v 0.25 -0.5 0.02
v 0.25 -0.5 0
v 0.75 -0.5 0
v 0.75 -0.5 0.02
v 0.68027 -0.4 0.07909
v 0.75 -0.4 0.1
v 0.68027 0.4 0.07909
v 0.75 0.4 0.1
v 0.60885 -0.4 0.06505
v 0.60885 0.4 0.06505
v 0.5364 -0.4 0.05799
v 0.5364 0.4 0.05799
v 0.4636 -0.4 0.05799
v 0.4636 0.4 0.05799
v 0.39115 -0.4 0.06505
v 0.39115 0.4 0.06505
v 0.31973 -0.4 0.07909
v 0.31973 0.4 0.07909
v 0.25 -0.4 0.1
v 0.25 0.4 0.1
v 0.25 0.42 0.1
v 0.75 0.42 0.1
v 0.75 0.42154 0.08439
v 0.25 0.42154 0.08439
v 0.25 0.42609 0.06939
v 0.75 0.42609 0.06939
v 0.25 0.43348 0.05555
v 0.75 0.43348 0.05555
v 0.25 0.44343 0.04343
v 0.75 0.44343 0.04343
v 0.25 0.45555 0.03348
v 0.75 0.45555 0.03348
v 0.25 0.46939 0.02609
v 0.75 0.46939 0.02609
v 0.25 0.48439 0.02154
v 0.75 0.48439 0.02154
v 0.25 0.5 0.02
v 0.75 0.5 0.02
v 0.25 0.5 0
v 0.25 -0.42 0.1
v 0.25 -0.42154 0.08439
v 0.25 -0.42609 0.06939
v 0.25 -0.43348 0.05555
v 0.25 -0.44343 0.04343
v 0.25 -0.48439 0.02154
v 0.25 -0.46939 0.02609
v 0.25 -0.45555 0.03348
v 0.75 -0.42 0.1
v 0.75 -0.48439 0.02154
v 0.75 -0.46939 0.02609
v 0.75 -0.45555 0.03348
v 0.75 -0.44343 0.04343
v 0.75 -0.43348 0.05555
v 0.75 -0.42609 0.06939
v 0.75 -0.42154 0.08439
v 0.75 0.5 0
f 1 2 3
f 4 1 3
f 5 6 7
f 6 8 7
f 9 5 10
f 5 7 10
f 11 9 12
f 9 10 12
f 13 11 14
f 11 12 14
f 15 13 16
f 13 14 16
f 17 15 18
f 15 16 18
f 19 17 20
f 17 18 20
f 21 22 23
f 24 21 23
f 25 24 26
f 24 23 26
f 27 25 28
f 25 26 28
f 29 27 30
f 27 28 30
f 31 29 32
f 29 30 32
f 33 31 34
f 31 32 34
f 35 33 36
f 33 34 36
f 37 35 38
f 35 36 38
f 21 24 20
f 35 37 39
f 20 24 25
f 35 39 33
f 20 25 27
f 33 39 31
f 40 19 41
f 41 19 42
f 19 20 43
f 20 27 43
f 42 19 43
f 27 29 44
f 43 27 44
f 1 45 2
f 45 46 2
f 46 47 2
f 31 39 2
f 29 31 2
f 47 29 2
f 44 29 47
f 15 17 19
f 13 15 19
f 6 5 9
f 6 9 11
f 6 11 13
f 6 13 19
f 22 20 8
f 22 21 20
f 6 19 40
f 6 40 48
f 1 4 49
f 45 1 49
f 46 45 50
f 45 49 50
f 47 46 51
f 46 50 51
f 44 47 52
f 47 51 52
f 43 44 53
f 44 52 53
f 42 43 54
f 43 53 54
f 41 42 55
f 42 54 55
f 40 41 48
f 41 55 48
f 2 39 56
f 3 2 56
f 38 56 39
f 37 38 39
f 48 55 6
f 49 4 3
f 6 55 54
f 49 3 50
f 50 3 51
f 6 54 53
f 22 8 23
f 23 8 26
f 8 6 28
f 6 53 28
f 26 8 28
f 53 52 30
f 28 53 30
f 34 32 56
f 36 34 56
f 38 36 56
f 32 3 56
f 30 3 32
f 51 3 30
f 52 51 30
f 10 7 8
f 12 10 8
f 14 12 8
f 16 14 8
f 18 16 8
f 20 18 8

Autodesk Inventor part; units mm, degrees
ref_plane "YZ Plane" through (0, 0, 0) normal (1, 0, 0) x (0, 1, 0)
sketch "스케치1" plane through (0, 0, 0) normal (0, 0, 1) x (1, 0, 0)
  line L0 (-0.15, 0) -> (0.9, 0) construction
  line L1 (0, -0.7) -> (0, 0.7) construction
  line L2 (0.25, -0.5) -> (0.75, -0.5)
  line L3 (0.75, -0.5) -> (0.75, 0.5)
  line L4 (0.75, 0.5) -> (0.25, 0.5)
  line L5 (0.25, 0.5) -> (0.25, -0.5)
  point P0 (0, 0)
  point P1 (0.5, -0.5)
  dimension "d7" = 0.5
  dimension "d8" = 1
  dimension "d9" = 0.25
extrude "돌출1" add sketch "스케치1" along normal blind 0.1
sketch "스케치3" plane through (0.25, 0.5, 0) normal (0, 1, 0) x (1, 0, 0)
  line L0 (-0.25, 0.7571) -> (-0.25, -0.2929) construction
  line L1 (-0.4, 0) -> (0.65, 0) construction
  line L2 (0.5, 0) -> (0, 0) projected
  line L3 (0, 0) -> (0, -0.1) projected
  line L4 (0.5, -0.1) -> (0, -0.1) projected
  line L5 (0.5, 0) -> (0.5, -0.1) projected
  arc A0 (0, -0.1) -> (0.5, -0.1) centre (0.25, 0.6071) ccw
  line L6 (0.25, -0.1) -> (0.25, 0.4799) construction
  point P0 (-0.25, 0)
  dimension "d10" = 0.75
sketch "스케치5" plane through (0, 0, 0.1) normal (0, 0, 1) x (1, 0, 0)
  line L0 (0.75, -0.5) -> (0.75, 0.5) projected
  line L1 (0.75, 0.5) -> (0.25, 0.5) projected
  line L2 (0.25, 0.5) -> (0.25, -0.5) projected
  line L3 (0.25, -0.5) -> (0.75, -0.5) projected
  line L4 (-0.15, 0) -> (0.9, 0) construction
  line L5 (0, -0.7) -> (0, 0.7) construction
  line L6 (-0.15, 0) -> (0.9, 0) construction
  line L7 (0, 0.7) -> (0, -0.7) construction
  line L8 (0.75, 0.4) -> (0.25, 0.4)
  line L9 (0.75, -0.4) -> (0.25, -0.4)
  point P0 (0, 0)
  dimension "d18" = 1
  dimension "d19" = 0.4
sketch "스케치6" plane through (0.75, -0.5, 0) normal (1, 0, 0) x (0, 0, -1)
  line L0 (0, 0) -> (0, 1) projected
  line L1 (0, 1) -> (-0.1, 1) projected
  line L2 (-0.1, 0) -> (-0.1, 1) projected
  line L3 (0, 0) -> (-0.1, 0) projected
  line L4 (0, 0.5) -> (-0.1, 0.5) construction
  line L5 (0, 0.92) -> (-0.1, 0.92)
  arc A0 (-0.1, 0.92) -> (-0.02, 1) centre (-0.1, 1) ccw
  arc A1 (-0.02, 0) -> (-0.1, 0.08) centre (-0.1, 0) ccw
  point P0 (-0.05, 0.5)
  point P1 (-0.05, 0.92)
  point P2 (-0.02, 0)
  point P3 (-0.1, 0.08)
  dimension "d20" = 0.42
extrude "돌출5" cut sketch "스케치6" against normal up to surface (0.5 mm away) contours L3 L2 A1 | L2 L1 A0
ref_plane "작업 평면1" through (0.25, 0.4, 0) normal (0, 1, 0) x (1, 0, 0)
sketch "스케치7" plane through (0.25, 0.4, 0) normal (0, 1, 0) x (1, 0, 0)
  line L0 (0, -0.1) -> (0, -0.02) projected
  line L1 (0.5, -0.1) -> (0, -0.1) projected
  line L2 (0.5, -0.02) -> (0.5, -0.1) projected
  line L3 (0, -0.02) -> (0.5, -0.02) projected
  line L4 (0, -0.02) -> (0.5, -0.02) projected
  arc A0 (0.5, -0.1) -> (0, -0.1) centre (0.25, -0.8071) ccw
  point P0 (-0.25, 0)
  dimension "d24" = 0.75
ref_plane "작업 평면2" through (0.25, -0.4, 0) normal (0, -1, 0) x (1, 0, 0)
extrude "돌출6" cut sketch "스케치7" against normal up to surface (0.8 mm away) contours A0 L1
properties part number "flat_surface_1"
